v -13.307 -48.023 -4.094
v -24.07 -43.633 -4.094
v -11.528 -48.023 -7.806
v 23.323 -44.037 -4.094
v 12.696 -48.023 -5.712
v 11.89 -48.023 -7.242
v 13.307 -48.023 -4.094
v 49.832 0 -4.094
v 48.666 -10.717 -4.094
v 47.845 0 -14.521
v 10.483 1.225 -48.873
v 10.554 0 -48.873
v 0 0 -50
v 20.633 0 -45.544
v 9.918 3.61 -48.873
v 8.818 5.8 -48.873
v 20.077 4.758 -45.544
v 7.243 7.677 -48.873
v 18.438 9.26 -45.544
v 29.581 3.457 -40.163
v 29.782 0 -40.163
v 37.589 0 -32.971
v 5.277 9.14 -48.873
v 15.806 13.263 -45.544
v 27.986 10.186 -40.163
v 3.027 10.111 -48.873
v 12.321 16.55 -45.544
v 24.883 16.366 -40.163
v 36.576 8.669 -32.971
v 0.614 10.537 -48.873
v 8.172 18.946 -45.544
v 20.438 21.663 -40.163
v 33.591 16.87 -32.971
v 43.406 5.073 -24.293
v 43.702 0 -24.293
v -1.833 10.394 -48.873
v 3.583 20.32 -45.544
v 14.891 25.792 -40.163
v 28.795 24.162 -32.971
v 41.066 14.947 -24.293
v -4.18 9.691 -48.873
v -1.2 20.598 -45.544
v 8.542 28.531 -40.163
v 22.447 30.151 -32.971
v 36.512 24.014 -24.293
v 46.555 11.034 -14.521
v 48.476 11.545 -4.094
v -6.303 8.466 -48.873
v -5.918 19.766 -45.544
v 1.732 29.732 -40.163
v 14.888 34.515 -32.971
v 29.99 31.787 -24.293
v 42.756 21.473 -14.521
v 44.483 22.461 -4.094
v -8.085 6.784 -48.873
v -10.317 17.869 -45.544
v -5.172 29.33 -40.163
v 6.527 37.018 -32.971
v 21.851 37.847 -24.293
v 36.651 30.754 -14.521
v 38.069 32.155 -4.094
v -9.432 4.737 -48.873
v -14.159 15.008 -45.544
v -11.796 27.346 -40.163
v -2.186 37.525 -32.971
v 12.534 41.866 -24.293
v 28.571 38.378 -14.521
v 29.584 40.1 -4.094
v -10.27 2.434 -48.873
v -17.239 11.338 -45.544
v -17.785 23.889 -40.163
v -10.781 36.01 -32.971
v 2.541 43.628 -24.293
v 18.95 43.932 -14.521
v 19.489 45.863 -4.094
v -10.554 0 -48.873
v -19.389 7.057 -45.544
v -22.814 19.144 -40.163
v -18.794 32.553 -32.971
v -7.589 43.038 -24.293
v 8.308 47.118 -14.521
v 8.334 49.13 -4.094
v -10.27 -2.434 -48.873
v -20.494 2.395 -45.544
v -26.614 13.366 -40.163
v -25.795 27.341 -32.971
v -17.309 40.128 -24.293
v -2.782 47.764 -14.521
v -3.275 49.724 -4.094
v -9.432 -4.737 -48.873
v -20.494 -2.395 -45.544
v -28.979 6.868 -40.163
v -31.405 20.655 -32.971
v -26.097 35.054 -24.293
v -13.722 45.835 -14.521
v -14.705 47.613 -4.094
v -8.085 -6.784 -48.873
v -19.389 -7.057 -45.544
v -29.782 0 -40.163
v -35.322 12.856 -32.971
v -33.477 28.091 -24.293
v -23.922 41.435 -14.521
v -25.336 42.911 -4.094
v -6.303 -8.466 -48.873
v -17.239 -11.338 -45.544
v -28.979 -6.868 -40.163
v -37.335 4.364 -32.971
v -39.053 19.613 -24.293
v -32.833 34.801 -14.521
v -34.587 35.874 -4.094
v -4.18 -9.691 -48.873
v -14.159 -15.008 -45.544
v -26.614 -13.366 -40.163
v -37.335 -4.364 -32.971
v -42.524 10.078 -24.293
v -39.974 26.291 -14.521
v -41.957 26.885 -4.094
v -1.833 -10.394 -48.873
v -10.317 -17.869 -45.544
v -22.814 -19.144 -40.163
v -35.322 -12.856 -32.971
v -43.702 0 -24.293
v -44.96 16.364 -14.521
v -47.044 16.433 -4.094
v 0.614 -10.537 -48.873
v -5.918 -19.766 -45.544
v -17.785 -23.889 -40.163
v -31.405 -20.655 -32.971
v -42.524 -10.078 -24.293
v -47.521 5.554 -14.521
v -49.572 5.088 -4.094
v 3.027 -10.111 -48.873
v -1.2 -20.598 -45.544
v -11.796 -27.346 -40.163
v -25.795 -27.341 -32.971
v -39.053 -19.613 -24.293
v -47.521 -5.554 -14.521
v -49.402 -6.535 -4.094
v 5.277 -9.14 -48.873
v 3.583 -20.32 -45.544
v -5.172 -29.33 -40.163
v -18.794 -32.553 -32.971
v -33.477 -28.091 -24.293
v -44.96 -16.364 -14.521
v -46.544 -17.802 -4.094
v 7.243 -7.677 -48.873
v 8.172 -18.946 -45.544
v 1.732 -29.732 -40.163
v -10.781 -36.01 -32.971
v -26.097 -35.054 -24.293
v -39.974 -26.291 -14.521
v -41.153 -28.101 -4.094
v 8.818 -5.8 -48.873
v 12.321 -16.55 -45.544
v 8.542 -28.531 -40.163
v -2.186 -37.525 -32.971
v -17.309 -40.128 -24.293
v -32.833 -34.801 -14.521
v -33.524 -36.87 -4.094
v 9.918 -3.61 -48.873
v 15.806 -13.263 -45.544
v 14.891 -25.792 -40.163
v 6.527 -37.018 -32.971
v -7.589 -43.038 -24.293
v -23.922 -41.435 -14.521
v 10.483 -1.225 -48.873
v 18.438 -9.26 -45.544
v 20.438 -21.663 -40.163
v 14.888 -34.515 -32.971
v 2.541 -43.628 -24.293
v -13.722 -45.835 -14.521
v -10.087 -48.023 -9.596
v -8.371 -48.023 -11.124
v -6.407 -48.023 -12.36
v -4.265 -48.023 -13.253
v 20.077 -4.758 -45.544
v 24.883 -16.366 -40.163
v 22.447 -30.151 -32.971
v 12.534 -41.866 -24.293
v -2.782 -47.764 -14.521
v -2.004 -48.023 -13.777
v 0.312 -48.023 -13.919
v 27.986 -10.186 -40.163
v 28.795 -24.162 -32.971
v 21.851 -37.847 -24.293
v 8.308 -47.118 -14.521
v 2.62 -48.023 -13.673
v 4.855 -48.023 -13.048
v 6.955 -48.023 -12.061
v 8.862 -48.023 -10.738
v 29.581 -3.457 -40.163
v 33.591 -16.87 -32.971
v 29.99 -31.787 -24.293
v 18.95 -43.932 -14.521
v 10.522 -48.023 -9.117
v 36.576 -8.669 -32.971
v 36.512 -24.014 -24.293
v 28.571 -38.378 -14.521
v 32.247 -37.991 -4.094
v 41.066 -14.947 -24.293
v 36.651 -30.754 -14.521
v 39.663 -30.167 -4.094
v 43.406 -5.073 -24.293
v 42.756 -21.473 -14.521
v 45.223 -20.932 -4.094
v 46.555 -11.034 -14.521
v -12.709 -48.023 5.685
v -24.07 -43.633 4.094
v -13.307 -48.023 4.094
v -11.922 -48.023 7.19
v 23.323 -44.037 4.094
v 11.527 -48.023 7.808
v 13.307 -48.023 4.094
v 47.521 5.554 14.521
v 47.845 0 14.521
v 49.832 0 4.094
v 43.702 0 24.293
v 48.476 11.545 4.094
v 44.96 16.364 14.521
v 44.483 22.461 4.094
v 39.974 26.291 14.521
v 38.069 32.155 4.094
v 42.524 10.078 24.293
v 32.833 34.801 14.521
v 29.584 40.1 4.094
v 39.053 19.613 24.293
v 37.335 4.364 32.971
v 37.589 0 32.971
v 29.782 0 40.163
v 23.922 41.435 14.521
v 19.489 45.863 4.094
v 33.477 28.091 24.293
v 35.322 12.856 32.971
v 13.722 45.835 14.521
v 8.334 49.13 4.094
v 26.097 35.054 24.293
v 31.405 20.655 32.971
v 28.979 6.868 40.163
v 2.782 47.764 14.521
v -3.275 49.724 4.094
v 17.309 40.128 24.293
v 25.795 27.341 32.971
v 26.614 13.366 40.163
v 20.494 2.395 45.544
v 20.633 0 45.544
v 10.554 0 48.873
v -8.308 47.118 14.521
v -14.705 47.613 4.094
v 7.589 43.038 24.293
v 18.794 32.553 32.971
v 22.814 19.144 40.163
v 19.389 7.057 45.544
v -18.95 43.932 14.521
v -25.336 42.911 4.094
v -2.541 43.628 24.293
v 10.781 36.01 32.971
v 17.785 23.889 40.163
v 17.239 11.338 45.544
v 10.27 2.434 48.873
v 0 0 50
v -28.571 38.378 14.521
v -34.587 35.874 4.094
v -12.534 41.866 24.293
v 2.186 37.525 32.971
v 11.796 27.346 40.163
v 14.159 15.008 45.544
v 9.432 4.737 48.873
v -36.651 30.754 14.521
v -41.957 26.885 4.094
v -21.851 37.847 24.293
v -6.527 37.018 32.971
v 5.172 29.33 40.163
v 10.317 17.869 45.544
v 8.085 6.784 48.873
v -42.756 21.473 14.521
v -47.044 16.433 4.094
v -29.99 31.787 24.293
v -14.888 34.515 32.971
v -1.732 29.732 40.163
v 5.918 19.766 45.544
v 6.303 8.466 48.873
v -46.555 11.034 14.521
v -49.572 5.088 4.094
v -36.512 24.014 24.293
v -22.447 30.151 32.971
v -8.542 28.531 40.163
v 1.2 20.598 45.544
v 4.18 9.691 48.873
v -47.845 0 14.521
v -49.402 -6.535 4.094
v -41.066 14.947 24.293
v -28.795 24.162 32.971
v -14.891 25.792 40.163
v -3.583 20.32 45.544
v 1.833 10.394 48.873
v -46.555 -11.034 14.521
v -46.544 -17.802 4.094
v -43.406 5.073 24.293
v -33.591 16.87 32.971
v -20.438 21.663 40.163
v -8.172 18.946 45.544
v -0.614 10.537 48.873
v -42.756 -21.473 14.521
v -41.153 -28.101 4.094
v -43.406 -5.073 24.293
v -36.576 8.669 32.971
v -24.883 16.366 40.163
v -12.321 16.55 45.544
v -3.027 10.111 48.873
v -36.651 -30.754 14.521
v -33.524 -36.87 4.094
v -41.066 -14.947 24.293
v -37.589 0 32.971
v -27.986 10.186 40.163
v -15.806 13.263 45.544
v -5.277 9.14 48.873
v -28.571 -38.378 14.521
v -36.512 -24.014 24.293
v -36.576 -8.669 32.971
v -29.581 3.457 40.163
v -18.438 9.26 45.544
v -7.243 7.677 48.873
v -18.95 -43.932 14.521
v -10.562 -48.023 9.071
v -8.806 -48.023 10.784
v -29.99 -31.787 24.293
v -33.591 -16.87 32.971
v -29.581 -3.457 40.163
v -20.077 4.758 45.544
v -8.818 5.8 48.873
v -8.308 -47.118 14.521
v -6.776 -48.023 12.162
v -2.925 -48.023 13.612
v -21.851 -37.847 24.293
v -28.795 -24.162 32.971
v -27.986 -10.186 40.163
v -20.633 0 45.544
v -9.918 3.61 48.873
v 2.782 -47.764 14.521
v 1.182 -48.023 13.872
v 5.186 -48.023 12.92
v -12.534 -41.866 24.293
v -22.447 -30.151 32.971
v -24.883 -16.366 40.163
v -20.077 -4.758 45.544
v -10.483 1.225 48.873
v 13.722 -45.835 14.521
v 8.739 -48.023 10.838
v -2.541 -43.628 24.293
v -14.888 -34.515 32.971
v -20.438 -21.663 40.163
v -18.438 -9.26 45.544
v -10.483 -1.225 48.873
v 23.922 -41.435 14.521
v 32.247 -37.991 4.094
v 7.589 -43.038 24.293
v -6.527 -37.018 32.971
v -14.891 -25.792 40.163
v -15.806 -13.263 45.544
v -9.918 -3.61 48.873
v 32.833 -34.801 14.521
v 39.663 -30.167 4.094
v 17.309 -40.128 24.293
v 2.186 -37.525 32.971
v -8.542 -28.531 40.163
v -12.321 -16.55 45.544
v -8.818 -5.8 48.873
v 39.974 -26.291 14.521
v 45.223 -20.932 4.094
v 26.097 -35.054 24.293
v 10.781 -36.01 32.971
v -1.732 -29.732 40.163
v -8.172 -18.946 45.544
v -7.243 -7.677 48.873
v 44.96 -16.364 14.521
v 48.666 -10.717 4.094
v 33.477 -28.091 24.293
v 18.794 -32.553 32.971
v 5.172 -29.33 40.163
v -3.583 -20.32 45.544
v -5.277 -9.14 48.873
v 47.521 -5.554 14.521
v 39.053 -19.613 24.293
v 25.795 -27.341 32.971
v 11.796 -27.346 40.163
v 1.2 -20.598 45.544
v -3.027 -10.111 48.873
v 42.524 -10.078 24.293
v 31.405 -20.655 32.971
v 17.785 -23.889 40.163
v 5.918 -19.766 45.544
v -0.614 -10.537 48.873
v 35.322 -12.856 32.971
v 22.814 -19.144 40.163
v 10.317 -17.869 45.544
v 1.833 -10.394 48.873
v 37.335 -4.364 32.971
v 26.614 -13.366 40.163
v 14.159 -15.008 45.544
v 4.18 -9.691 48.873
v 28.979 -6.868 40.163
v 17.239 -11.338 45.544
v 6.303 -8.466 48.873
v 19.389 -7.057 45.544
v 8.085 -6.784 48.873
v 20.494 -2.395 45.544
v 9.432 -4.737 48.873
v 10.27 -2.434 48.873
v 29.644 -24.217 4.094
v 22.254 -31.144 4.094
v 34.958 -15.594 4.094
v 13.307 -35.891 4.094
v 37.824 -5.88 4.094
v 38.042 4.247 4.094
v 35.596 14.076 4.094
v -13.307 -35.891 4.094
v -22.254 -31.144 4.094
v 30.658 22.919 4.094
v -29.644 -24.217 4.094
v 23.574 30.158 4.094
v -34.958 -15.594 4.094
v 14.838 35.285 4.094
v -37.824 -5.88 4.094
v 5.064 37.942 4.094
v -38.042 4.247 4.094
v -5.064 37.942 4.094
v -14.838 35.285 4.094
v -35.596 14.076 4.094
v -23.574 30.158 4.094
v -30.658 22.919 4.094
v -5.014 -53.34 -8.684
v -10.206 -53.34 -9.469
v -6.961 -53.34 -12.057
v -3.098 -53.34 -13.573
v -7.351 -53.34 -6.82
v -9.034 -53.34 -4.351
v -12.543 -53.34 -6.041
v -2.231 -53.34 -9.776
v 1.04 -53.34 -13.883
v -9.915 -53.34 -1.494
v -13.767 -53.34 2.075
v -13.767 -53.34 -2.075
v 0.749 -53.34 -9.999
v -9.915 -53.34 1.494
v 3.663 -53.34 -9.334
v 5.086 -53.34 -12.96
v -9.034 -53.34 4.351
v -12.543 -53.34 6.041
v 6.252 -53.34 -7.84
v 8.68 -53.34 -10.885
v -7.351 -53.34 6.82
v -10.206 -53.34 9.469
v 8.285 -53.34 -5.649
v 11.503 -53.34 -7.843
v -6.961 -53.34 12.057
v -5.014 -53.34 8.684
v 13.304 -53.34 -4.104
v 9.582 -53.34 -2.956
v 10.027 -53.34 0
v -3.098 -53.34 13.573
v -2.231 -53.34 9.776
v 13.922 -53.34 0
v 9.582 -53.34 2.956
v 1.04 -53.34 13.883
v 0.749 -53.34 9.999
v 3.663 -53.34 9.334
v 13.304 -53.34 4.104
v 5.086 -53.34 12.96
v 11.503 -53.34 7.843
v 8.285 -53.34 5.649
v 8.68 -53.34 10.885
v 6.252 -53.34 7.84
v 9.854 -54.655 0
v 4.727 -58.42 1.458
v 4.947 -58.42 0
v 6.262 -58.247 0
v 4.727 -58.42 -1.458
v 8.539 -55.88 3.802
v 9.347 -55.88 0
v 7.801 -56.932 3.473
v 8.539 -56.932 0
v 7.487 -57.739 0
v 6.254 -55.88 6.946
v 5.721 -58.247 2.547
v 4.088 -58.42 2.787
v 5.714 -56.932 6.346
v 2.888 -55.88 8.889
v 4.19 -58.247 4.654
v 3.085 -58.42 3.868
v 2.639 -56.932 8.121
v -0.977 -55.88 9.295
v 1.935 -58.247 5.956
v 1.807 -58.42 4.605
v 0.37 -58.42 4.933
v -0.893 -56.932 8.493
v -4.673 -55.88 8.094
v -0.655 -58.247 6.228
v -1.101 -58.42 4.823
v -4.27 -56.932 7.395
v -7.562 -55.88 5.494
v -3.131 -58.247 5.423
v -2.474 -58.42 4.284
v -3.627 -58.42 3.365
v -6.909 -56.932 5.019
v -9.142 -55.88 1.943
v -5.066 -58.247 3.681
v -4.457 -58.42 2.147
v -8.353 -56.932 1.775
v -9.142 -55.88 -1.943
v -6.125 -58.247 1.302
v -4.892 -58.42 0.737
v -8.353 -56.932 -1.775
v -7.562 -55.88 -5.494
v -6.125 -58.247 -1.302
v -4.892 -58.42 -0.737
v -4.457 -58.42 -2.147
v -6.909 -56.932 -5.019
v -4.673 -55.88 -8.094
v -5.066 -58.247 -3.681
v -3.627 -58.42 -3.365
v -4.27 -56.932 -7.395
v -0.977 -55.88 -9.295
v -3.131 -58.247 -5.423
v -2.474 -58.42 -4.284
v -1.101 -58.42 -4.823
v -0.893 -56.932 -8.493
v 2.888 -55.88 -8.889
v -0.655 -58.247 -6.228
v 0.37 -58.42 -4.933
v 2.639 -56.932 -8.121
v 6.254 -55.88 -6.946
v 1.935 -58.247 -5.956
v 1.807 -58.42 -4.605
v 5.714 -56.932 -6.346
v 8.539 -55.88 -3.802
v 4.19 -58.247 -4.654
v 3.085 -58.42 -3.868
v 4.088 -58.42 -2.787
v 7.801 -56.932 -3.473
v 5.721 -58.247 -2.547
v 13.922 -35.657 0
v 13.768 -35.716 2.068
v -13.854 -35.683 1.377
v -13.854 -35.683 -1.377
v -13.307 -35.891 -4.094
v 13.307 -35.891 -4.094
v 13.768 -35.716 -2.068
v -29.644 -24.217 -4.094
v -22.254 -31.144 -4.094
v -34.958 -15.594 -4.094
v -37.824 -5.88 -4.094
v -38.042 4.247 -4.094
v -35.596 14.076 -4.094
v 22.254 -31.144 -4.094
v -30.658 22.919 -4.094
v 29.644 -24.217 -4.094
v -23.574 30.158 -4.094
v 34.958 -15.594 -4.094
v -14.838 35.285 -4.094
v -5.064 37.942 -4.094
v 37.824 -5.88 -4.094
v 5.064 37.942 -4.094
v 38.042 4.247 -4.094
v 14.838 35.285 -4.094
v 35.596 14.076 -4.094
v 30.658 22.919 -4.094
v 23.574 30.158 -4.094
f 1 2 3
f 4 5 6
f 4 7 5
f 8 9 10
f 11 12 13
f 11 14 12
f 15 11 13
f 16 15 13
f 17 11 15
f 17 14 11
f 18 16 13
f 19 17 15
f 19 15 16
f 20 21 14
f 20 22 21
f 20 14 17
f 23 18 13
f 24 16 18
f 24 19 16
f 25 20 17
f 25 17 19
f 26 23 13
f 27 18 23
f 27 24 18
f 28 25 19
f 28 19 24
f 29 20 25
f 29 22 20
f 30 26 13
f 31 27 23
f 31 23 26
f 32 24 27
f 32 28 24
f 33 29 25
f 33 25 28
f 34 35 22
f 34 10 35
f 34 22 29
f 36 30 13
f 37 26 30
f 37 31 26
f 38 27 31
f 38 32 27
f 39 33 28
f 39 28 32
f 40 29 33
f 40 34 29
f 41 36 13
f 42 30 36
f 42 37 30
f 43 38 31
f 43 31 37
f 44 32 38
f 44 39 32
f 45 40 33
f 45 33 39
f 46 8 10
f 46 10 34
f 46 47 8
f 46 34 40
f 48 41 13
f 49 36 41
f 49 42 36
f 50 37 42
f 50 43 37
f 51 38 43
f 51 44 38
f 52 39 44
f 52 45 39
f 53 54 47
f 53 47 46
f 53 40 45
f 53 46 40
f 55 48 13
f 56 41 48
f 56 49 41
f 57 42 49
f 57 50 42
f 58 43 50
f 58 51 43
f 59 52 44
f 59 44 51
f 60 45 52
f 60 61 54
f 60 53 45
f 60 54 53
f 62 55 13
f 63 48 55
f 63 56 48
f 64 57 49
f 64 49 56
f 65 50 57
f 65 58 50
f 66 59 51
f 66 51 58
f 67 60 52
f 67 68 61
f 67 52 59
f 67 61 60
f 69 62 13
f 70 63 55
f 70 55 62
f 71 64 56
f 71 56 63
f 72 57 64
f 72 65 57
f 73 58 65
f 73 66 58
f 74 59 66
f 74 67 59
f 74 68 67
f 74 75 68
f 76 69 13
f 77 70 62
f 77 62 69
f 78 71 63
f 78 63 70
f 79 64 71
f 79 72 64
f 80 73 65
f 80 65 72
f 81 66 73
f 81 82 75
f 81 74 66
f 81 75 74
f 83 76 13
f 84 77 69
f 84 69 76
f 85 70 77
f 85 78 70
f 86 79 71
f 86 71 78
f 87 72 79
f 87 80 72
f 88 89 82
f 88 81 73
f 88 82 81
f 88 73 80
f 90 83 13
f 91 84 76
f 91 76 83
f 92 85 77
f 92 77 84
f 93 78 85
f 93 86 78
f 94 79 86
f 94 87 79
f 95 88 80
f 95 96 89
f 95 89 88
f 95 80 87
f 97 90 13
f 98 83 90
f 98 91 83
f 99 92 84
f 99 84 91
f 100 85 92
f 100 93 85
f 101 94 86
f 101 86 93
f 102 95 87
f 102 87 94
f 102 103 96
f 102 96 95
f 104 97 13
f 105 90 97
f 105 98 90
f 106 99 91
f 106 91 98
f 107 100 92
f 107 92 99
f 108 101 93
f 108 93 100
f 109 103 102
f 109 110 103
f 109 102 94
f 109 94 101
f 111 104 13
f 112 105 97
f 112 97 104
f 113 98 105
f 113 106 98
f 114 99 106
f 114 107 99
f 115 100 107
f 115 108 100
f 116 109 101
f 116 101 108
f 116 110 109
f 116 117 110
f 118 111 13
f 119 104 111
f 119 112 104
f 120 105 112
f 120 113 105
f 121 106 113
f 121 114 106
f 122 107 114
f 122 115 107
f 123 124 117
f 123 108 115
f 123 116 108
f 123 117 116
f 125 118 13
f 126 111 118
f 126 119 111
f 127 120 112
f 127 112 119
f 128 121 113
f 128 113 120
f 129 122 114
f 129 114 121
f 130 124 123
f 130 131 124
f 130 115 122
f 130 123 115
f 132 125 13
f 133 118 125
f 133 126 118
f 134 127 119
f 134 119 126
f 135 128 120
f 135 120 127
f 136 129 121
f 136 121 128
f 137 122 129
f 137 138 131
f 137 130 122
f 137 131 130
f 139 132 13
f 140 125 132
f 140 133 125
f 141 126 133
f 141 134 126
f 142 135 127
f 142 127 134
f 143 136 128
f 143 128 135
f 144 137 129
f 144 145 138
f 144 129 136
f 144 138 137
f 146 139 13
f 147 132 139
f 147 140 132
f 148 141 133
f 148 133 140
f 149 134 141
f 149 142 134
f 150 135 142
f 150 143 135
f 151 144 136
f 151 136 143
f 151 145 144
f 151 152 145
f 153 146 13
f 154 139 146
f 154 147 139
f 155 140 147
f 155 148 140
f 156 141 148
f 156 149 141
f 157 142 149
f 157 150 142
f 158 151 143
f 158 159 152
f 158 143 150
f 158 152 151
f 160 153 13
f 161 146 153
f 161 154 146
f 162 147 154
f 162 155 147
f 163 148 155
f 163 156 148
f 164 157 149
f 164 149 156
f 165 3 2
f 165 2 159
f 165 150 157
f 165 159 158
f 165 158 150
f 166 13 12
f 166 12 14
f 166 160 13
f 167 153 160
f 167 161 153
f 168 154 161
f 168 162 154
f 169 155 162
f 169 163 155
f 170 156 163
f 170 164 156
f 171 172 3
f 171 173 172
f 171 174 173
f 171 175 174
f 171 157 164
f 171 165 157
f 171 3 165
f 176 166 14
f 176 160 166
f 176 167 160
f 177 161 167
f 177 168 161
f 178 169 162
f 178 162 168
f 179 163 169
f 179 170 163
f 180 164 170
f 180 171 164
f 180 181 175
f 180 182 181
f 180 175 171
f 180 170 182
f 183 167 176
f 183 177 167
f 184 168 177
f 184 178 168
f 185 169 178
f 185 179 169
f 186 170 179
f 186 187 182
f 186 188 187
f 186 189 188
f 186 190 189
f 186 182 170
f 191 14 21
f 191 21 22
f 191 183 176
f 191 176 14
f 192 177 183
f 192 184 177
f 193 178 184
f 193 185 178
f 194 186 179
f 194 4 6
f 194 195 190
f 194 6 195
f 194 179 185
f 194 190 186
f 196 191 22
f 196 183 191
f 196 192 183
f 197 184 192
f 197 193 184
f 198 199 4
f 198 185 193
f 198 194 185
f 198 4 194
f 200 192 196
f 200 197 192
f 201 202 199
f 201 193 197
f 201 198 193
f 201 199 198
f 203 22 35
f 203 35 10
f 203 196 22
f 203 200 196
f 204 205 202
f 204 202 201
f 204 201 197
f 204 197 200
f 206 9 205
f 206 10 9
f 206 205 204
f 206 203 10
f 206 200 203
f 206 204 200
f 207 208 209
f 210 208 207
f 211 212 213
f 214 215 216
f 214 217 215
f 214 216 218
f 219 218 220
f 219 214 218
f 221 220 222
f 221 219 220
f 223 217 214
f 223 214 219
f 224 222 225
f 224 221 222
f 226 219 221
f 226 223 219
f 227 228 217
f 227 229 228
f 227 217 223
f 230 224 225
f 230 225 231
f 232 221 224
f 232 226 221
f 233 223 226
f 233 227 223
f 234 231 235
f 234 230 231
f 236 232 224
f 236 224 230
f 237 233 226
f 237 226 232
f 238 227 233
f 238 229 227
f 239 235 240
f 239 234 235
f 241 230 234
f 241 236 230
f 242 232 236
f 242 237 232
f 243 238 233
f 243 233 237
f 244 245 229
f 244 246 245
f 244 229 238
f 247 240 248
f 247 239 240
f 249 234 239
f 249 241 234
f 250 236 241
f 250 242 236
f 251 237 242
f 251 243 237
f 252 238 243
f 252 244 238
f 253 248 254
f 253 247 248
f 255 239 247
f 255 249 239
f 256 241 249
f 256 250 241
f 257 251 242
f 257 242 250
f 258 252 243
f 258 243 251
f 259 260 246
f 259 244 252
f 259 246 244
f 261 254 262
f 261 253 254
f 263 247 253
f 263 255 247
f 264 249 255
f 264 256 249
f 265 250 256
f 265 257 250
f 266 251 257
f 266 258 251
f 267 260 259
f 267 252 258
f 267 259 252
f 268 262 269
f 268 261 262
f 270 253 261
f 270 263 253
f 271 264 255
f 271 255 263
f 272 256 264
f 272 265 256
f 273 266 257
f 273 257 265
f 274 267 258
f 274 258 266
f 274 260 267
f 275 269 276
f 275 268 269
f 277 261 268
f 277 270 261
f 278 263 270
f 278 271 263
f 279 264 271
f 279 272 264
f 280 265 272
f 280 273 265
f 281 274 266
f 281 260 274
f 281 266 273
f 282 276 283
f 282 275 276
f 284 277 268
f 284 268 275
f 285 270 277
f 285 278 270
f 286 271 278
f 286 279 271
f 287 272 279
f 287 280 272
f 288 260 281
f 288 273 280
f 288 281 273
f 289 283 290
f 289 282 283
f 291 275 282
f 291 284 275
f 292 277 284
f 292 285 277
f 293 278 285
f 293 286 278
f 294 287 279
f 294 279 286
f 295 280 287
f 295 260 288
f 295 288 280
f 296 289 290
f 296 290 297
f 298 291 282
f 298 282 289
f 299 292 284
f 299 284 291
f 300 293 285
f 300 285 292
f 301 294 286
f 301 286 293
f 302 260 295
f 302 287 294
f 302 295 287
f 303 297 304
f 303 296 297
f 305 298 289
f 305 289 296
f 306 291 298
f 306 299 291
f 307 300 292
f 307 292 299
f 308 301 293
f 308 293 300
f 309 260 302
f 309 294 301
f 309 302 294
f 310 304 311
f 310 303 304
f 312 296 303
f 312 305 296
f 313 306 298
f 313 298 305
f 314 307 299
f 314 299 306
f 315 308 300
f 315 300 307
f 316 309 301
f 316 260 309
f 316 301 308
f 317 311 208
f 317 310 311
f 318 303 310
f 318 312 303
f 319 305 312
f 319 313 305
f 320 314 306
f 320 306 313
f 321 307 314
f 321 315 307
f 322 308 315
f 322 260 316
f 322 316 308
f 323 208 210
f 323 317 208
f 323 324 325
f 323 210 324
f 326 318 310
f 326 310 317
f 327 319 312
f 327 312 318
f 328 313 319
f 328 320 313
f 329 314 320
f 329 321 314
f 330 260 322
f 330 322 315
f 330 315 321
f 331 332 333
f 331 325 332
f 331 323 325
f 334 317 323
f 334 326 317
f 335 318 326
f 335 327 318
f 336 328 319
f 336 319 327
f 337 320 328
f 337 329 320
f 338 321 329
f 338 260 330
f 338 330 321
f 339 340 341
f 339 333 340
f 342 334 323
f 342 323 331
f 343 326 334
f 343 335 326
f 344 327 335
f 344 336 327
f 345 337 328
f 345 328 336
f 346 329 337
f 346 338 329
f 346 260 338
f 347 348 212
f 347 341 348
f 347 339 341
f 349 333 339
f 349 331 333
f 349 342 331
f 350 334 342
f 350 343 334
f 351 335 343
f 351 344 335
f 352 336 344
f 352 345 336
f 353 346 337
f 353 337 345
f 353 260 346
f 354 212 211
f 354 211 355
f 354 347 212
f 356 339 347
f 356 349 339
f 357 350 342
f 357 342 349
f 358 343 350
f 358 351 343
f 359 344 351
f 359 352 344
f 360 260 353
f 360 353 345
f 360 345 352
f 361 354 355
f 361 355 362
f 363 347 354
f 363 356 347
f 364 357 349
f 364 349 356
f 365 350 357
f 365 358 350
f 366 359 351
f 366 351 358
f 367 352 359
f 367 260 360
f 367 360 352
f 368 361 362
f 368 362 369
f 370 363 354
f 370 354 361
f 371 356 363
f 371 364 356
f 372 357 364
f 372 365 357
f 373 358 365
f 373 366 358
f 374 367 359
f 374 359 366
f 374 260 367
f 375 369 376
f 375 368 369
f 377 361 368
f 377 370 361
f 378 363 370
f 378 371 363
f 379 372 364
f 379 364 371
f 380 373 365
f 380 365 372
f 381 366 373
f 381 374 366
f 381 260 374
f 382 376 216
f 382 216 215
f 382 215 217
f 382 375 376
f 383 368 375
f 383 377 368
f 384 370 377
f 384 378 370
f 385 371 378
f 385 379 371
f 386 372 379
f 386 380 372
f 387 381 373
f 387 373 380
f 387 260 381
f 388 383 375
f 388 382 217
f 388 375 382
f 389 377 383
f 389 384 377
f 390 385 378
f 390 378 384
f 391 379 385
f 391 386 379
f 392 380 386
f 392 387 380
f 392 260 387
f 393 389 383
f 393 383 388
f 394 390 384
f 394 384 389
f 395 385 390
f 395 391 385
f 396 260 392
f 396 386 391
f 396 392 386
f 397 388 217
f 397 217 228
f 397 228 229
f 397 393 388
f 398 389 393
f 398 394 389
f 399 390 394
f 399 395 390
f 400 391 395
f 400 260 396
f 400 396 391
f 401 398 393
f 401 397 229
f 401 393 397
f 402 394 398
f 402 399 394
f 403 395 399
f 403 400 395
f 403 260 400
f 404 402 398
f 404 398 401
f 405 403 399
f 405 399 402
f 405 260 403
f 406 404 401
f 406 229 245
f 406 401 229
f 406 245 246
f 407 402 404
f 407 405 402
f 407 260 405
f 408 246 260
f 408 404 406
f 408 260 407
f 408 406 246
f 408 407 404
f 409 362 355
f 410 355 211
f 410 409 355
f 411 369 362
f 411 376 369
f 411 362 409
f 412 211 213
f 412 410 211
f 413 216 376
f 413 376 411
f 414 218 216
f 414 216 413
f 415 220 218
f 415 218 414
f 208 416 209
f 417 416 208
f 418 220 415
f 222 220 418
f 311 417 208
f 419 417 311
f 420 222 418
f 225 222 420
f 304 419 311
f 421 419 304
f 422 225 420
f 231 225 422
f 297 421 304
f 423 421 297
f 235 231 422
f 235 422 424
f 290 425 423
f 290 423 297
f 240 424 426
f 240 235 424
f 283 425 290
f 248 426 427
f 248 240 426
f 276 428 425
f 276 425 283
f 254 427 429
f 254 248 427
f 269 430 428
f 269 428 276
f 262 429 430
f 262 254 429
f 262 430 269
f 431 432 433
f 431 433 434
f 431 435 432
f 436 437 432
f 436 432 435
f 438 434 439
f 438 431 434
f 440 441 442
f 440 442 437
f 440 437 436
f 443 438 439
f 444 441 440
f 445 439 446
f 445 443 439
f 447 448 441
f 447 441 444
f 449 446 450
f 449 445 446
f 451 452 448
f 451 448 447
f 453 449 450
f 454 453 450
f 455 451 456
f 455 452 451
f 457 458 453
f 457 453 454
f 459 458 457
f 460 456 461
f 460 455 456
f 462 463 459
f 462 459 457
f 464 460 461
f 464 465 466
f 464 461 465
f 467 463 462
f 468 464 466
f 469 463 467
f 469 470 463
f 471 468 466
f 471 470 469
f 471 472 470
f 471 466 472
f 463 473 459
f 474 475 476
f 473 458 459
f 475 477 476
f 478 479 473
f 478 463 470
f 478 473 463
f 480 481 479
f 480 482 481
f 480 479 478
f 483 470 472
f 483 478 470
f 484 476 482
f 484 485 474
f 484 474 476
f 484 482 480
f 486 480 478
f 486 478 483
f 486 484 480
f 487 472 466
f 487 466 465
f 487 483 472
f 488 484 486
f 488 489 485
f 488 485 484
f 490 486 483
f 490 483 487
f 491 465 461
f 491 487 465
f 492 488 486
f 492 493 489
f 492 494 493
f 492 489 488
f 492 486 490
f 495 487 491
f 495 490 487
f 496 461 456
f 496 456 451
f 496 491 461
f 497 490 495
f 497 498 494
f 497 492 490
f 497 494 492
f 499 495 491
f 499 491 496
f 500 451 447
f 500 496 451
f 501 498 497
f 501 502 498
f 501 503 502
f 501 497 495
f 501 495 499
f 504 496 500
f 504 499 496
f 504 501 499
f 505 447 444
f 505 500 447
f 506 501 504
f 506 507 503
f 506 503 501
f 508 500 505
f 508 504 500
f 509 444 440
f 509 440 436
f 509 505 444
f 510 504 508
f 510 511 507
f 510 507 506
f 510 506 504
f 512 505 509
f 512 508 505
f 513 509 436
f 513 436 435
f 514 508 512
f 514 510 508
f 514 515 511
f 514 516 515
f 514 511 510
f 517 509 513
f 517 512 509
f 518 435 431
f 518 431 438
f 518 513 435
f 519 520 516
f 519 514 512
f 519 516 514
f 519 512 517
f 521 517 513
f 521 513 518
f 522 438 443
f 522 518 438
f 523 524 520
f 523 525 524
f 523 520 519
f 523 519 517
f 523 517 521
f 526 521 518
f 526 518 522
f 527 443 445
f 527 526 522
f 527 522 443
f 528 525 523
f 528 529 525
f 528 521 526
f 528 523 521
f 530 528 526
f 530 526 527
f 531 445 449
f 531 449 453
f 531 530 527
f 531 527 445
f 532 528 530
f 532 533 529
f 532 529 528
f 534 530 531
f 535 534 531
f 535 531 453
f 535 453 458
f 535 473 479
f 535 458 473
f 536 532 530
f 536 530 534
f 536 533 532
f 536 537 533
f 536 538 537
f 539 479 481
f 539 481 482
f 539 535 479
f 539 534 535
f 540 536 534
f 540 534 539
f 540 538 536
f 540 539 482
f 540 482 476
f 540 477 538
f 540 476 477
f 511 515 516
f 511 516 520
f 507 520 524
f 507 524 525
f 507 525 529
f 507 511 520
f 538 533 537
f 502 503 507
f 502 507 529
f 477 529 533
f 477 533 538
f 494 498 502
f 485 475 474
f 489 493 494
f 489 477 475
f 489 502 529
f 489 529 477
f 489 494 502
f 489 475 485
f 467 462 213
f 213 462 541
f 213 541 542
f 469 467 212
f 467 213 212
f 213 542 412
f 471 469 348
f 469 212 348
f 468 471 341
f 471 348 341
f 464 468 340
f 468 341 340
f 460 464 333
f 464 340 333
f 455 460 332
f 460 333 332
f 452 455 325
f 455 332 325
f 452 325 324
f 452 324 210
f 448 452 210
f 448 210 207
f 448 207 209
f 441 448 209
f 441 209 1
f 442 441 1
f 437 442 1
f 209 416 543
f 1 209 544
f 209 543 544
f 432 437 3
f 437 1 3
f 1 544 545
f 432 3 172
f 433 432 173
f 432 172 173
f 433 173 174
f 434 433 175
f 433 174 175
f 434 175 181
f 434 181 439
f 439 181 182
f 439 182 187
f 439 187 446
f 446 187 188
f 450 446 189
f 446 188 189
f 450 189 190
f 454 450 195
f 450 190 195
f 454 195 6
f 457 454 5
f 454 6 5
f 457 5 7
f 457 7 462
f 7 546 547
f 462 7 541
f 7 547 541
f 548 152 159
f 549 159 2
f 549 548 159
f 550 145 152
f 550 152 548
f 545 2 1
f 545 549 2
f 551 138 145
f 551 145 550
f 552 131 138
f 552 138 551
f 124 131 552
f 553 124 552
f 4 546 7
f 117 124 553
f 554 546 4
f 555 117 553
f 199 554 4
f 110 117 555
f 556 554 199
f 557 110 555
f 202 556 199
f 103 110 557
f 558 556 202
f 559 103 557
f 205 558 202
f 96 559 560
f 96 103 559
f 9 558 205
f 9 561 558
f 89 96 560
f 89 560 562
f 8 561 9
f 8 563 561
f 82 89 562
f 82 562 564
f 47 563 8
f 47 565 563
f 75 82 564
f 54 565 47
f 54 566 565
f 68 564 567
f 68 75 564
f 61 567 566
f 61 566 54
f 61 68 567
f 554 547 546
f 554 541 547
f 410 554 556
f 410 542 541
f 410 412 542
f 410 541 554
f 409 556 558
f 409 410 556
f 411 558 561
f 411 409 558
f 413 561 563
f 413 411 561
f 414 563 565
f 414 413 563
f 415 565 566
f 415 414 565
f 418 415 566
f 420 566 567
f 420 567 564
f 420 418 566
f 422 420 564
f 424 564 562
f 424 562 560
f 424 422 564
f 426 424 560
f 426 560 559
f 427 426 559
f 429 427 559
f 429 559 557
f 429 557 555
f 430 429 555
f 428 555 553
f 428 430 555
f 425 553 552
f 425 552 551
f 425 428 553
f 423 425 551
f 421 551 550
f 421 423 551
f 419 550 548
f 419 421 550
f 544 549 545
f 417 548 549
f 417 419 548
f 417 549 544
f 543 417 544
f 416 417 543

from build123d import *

# Parameters (mm, degrees)
F2_R     = 13.922185385
F3_DEPTH = 53.34
F4_R     = 10.0272817178
F5_DEPTH = 5.08
F6_R     = 5.07999


# Not quite as in the source:
# - a fillet or chamfer is up to 0.001 mm smaller than in the source, because OpenCascade refuses the exact size


with BuildPart() as f1:
    # F0 (on Front) → F1 (revolve)
    with BuildSketch(Plane.XZ):
        with BuildLine():
            Line((0, 0), (0, -50))
            ThreePointArc((0, -50), (33.8768500277, -36.7744344919), (49.8320800855, -4.0943612879))
            Line((49.8320800855, -4.0943612879), (38.2781662047, -4.0943612879))
            Line((38.2781662047, -4.0943612879), (38.2781662047, 0))
            Line((38.2781662047, 0), (38.2781662047, 4.0943612879))
            Line((38.2781662047, 4.0943612879), (49.8320800855, 4.0943612879))
            ThreePointArc((49.8320800855, 4.0943612879), (33.8768500277, 36.7744344919), (0, 50))
            Line((0, 50), (0, 0))
        make_face()
    revolve(axis=Axis((0, 0, 25), (0, 0, 1)))

    # F2 (on Front) → F3 (join)
    with BuildSketch(Plane.XZ):
        Circle(F2_R)
    extrude(amount=F3_DEPTH)

    # F4 (on face) → F5 (join)
    with BuildSketch(Plane.XZ.offset(53.34)):
        Circle(F4_R)
    extrude(amount=F5_DEPTH)

    # F6 (radius 5.08 in the source; OpenCascade refuses exactly that, so slightly less here)
    f6_edges = [f1.edges().sort_by_distance(p)[0] for p in [
        (-10.027282, -58.42, 0),
    ]]
    fillet(f6_edges, radius=F6_R)


solid = f1.part
